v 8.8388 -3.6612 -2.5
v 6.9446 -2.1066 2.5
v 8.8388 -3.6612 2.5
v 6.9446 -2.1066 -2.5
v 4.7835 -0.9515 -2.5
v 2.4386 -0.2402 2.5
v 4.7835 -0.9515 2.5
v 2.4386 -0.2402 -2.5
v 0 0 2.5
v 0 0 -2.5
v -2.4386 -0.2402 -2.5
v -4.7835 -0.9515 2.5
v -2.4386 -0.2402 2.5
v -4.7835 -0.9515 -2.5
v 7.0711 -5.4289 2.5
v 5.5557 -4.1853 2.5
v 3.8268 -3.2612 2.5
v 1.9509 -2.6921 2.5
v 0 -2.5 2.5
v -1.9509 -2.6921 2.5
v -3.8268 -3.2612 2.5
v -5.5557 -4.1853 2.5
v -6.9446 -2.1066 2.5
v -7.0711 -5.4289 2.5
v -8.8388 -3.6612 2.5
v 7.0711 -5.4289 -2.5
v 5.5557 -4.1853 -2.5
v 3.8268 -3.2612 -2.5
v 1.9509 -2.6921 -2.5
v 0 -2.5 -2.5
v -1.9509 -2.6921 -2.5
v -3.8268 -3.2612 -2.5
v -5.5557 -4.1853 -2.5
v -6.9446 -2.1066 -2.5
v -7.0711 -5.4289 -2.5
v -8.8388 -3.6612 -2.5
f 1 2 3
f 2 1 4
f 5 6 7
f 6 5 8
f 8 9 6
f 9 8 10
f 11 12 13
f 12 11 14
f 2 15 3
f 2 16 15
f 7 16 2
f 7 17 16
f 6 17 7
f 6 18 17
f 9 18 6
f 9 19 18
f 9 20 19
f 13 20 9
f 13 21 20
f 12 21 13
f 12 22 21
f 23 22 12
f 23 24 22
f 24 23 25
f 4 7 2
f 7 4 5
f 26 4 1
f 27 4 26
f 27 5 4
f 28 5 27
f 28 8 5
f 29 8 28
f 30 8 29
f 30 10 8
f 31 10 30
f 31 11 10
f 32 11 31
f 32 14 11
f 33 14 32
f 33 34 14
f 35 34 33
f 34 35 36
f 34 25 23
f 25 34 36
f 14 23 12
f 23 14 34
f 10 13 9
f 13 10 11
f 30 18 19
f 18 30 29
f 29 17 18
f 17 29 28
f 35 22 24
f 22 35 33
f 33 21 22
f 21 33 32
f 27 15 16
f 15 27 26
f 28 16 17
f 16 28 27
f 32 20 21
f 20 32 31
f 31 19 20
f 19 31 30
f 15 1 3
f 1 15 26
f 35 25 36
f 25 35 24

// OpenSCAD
// file: Cylinder.scad
// Auther: Tobias Grundtvig
// Date: Oct 1, 2020
//
// A wrapper of the build-in cylinder module, to get consistent naming

Cylinder(diameter=10, height=5, t_x="neg", t_z="pos");

module Cylinder(diameter, height, t_x="center", t_y="center", t_z="center", angular_resolution=32)
{
    tx = t_x == "neg" ? -diameter/2 : 
            t_x == "pos" ? diameter/2 : 0;
    ty = t_y == "neg" ? -diameter/2 : 
            t_y == "pos" ? diameter/2 : 0;
    tz = t_z == "neg" ? -height/2 : 
            t_z == "pos" ? height/2 : 0;
    translate([tx,ty,tz])
        cylinder(d=diameter, h=height, center=true, $fn=angular_resolution);
}
// file: Flat_Ring.scad
// Auther: Tobias Grundtvig
// Date: Oct 1, 2020
//
// A flat ring

use  <Cylinder.scad>

Flat_Ring(inner_diameter=20, outer_diameter=25, height=5,t_x="neg", angular_resolution=32);

module Flat_Ring(   inner_diameter,
                    outer_diameter,
                    height,
                    t_x="center",
                    t_y="center",
                    t_z="center",
                    angular_resolution=32)
{
    tx = t_x == "neg" ? -outer_diameter/2 : 
            t_x == "pos" ? outer_diameter/2 : 0;
    ty = t_y == "neg" ? -outer_diameter/2 : 
            t_y == "pos" ? outer_diameter/2 : 0;
    tz = t_z == "neg" ? -height/2 : 
            t_z == "pos" ? height/2 : 0;
    translate([tx, ty, tz])
    difference()
    {
        Cylinder(   diameter=outer_diameter,
                    height=height,
                    angular_resolution=angular_resolution   );
        translate([0,0,-1])
        Cylinder(   diameter=inner_diameter,
                    height=height+3, 
                    angular_resolution=angular_resolution);
    }
}
// file: Pie_2D.scad
// Auther: Tobias Grundtvig
// Date: Oct 1, 2020
//
//  A 2-dimensional pie
//  can be used to linear-extract a 3D Pie


Pie_2D(diameter=10, from_angle=45, to_angle=315, steps=32);
translate([2,0,0])
Pie_2D(diameter=10, from_angle=315, to_angle=45, steps=32);

module Pie_2D(diameter, from_angle, to_angle, steps=32)
{
    step_size = from_angle < to_angle ?
                (to_angle-from_angle)/steps :
                (360 - (from_angle-to_angle))/steps;
    r=diameter/2;
    points = from_angle < to_angle ?
        [
            for(i = [0:steps])
            [r * cos(from_angle+i*step_size), r * sin(from_angle+i*step_size)]
        ] :
        [
            for(i = [0:steps])
            [r * cos(from_angle+i*step_size), r * sin(from_angle+i*step_size)]
        ];
            
    polygon(concat([[0, 0]], points));
}
// main file
// Auther: Tobias Grundtvig
// Date: Oct 1, 2020
//
// A segment of a flat ring

use <Pie_2D.scad>
use <Flat_Ring.scad>

Flat_Ring_Segment(  inner_diameter=20,
                    outer_diameter=25,
                    height=5,
                    from_angle=45,
                    to_angle=135,
                    t_y="neg",
                    angular_resolution=32);

module Flat_Ring_Segment(   inner_diameter,
                            outer_diameter,
                            height,
                            from_angle,
                            to_angle,
                            t_x="center",
                            t_y="center",
                            t_z="center",
                            angular_resolution=32)
{
    tx = t_x == "neg" ? -outer_diameter/2 : 
            t_x == "pos" ? outer_diameter/2 : 0;
    ty = t_y == "neg" ? -outer_diameter/2 : 
            t_y == "pos" ? outer_diameter/2 : 0;
    tz = t_z == "neg" ? -height/2 : 
            t_z == "pos" ? height/2 : 0;
    translate([tx, ty, tz])
    intersection()
    {
        linear_extrude(height=height, center=true)
        {
            Pie_2D
            (
                diameter=outer_diameter*2,
                from_angle=from_angle,
                to_angle=to_angle,
                steps = 8
            );
        }
        Flat_Ring(  inner_diameter=inner_diameter,
                    outer_diameter=outer_diameter,
                    height=height,
                    angular_resolution=angular_resolution);
    }
}
